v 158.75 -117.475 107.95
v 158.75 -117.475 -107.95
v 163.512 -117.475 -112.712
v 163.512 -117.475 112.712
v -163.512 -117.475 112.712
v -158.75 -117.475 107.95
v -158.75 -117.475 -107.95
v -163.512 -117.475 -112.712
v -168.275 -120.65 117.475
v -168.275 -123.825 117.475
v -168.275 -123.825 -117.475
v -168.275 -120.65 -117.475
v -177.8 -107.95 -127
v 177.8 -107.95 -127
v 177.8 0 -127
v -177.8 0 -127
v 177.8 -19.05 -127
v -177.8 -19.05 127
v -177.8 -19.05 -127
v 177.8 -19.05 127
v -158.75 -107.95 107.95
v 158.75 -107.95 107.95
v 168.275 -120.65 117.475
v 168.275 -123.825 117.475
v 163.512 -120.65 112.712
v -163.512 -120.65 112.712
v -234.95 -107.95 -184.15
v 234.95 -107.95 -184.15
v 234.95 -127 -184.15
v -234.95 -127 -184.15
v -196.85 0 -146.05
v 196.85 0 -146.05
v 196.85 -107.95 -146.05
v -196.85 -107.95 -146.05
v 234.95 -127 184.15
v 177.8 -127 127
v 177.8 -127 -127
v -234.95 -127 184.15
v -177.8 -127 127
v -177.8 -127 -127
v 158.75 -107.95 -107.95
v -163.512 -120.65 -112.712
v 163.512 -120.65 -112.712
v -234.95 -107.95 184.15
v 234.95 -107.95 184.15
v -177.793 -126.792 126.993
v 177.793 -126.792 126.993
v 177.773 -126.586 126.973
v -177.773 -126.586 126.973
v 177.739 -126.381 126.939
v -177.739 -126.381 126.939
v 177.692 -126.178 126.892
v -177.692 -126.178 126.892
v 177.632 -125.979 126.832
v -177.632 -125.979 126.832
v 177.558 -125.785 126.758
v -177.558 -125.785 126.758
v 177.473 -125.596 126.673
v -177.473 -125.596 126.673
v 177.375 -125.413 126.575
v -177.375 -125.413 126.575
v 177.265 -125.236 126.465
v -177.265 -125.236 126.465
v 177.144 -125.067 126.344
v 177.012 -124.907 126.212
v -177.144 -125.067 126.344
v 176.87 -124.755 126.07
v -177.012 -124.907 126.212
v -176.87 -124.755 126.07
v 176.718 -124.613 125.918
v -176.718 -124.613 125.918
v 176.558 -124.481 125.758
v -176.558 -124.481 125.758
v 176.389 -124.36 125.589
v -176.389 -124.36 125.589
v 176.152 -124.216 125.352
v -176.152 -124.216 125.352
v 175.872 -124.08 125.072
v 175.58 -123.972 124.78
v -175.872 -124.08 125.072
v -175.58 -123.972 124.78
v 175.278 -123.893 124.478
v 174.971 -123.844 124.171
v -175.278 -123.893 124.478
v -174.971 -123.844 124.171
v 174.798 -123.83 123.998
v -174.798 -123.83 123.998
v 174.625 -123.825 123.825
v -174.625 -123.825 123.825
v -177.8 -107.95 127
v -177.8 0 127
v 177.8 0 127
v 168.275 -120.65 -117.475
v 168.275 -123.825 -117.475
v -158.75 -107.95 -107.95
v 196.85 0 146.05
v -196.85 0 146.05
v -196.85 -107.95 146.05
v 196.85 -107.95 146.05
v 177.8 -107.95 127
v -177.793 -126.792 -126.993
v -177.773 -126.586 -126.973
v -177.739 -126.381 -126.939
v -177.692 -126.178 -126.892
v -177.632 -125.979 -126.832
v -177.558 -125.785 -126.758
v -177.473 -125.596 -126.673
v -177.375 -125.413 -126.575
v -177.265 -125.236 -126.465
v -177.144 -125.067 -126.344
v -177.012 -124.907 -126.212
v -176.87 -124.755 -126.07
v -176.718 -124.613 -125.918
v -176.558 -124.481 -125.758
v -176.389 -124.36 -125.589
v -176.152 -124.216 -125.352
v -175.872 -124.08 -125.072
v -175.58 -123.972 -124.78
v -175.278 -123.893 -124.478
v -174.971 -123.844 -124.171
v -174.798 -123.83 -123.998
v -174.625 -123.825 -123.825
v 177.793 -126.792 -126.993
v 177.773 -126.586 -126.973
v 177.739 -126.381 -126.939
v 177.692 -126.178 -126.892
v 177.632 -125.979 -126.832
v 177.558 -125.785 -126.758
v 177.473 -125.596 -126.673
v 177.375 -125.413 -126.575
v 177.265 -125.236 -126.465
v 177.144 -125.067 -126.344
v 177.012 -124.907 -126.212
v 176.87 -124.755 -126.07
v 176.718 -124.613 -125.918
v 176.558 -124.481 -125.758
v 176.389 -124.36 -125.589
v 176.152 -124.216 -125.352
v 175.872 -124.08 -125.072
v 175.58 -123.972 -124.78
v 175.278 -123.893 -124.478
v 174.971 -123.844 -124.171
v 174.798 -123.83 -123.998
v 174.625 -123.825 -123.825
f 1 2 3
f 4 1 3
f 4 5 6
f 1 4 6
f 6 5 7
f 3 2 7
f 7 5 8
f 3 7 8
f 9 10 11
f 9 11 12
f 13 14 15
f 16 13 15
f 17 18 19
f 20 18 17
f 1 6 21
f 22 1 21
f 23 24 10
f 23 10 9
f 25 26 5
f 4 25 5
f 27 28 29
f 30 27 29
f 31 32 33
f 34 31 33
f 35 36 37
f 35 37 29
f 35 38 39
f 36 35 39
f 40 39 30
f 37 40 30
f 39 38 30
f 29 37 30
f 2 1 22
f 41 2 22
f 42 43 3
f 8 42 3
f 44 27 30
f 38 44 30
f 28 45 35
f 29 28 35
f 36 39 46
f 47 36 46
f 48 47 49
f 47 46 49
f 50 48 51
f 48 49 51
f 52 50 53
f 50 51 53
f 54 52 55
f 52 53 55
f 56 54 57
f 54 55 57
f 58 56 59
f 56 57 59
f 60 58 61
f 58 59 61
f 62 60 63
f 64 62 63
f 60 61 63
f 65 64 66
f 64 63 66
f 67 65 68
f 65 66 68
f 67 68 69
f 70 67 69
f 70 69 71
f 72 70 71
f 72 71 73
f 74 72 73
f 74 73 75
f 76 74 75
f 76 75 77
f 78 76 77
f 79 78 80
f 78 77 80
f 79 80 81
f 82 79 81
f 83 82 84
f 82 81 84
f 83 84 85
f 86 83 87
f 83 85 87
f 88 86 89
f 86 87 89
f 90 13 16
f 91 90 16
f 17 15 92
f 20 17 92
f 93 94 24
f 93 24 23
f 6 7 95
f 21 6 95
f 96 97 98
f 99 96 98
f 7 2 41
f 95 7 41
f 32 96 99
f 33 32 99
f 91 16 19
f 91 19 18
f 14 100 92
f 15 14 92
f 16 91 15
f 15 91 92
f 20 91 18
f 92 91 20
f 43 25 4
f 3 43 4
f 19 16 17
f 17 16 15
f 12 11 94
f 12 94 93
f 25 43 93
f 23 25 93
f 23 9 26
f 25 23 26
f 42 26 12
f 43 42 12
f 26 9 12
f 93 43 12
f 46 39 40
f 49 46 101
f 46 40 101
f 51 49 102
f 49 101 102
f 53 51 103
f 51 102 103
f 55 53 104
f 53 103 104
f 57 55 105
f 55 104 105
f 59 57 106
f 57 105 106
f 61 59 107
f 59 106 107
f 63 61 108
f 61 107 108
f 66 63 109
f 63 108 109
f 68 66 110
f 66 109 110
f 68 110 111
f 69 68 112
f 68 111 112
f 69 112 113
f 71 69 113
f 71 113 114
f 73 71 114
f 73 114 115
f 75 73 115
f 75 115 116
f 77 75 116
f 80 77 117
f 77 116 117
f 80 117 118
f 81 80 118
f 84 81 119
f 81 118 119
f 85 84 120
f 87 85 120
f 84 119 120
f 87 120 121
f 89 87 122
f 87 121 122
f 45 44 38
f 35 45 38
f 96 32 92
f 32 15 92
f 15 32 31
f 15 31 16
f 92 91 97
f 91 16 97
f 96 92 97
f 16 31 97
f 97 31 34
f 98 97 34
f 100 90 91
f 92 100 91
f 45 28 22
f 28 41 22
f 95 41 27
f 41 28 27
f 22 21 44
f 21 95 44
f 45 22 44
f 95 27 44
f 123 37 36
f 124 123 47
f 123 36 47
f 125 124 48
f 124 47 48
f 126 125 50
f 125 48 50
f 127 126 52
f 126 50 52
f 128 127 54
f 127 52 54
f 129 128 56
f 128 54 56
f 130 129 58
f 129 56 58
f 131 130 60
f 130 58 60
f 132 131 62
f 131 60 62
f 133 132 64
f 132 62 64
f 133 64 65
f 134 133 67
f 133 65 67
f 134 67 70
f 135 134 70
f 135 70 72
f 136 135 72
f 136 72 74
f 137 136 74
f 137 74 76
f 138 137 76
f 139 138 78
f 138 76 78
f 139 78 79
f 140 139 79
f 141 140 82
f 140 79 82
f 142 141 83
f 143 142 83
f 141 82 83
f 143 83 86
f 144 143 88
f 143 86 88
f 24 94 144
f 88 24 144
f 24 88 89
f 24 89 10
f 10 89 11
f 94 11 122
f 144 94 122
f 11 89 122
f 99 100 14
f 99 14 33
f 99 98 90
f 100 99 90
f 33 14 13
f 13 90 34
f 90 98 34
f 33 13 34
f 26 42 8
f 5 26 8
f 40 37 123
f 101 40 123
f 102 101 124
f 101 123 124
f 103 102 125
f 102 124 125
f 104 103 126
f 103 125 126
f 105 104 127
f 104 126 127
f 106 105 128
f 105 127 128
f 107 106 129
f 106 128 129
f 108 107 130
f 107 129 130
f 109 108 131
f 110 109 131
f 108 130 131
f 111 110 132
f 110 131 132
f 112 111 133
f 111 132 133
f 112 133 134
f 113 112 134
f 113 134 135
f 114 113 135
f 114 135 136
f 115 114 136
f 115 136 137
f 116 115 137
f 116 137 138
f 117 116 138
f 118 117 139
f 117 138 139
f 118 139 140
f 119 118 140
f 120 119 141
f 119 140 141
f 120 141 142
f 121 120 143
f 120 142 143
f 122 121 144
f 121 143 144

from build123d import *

# Parameters (mm, degrees)
F0_W     = 355.6
F0_H     = 254
F1_DEPTH = 19.05
F2_W     = 107.95
F2_H     = 19.05


with BuildPart() as f1:
    # F0 (on Front) → F1 (new body)
    with BuildSketch(Plane.XZ):
        Rectangle(F0_W, F0_H)
    extrude(amount=F1_DEPTH)


with BuildPart() as f3:
    # F3: sweep along a path in F0
    with BuildLine(Plane.XZ) as f3_path:
        Line((177.8, 127), (-177.8, 127))
        Line((-177.8, 127), (-177.8, -127))
        Line((-177.8, -127), (177.8, -127))
        Line((177.8, -127), (177.8, 127))
    # F2 (on Right) → F3 (sweep)
    with BuildSketch(Plane.YZ):
        with Locations((-53.975, 136.525)):
            Rectangle(F2_W, F2_H)
    sweep(path=f3_path.line, transition=Transition.RIGHT)


with BuildPart() as f5:
    # F5: sweep along a path in F0
    with BuildLine(Plane.XZ) as f5_path:
        Line((177.8, 127), (-177.8, 127))
        Line((-177.8, 127), (-177.8, -127))
        Line((-177.8, -127), (177.8, -127))
        Line((177.8, -127), (177.8, 127))
    # F4 (on Right) → F5 (sweep)
    with BuildSketch(Plane.YZ):
        with BuildLine():
            Line((-107.95, 127), (-107.95, 184.15))
            Line((-107.95, 184.15), (-127, 184.15))
            Line((-127, 184.15), (-127, 127))
            ThreePointArc((-127, 127), (-124.7549359697, 126.0700640303), (-123.825, 123.825))
            Line((-123.825, 123.825), (-123.825, 117.475))
            Line((-123.825, 117.475), (-120.65, 117.475))
            Line((-120.65, 117.475), (-120.65, 112.7125))
            Line((-120.65, 112.7125), (-117.4750008702, 112.7125))
            Line((-117.4750008702, 112.7125), (-117.4750008702, 107.95))
            Line((-117.4750008702, 107.95), (-107.95, 107.95))
            Line((-107.95, 107.95), (-107.95, 127))
        make_face()
    sweep(path=f5_path.line, transition=Transition.RIGHT)


solid = Compound([f1.part, f3.part, f5.part])
